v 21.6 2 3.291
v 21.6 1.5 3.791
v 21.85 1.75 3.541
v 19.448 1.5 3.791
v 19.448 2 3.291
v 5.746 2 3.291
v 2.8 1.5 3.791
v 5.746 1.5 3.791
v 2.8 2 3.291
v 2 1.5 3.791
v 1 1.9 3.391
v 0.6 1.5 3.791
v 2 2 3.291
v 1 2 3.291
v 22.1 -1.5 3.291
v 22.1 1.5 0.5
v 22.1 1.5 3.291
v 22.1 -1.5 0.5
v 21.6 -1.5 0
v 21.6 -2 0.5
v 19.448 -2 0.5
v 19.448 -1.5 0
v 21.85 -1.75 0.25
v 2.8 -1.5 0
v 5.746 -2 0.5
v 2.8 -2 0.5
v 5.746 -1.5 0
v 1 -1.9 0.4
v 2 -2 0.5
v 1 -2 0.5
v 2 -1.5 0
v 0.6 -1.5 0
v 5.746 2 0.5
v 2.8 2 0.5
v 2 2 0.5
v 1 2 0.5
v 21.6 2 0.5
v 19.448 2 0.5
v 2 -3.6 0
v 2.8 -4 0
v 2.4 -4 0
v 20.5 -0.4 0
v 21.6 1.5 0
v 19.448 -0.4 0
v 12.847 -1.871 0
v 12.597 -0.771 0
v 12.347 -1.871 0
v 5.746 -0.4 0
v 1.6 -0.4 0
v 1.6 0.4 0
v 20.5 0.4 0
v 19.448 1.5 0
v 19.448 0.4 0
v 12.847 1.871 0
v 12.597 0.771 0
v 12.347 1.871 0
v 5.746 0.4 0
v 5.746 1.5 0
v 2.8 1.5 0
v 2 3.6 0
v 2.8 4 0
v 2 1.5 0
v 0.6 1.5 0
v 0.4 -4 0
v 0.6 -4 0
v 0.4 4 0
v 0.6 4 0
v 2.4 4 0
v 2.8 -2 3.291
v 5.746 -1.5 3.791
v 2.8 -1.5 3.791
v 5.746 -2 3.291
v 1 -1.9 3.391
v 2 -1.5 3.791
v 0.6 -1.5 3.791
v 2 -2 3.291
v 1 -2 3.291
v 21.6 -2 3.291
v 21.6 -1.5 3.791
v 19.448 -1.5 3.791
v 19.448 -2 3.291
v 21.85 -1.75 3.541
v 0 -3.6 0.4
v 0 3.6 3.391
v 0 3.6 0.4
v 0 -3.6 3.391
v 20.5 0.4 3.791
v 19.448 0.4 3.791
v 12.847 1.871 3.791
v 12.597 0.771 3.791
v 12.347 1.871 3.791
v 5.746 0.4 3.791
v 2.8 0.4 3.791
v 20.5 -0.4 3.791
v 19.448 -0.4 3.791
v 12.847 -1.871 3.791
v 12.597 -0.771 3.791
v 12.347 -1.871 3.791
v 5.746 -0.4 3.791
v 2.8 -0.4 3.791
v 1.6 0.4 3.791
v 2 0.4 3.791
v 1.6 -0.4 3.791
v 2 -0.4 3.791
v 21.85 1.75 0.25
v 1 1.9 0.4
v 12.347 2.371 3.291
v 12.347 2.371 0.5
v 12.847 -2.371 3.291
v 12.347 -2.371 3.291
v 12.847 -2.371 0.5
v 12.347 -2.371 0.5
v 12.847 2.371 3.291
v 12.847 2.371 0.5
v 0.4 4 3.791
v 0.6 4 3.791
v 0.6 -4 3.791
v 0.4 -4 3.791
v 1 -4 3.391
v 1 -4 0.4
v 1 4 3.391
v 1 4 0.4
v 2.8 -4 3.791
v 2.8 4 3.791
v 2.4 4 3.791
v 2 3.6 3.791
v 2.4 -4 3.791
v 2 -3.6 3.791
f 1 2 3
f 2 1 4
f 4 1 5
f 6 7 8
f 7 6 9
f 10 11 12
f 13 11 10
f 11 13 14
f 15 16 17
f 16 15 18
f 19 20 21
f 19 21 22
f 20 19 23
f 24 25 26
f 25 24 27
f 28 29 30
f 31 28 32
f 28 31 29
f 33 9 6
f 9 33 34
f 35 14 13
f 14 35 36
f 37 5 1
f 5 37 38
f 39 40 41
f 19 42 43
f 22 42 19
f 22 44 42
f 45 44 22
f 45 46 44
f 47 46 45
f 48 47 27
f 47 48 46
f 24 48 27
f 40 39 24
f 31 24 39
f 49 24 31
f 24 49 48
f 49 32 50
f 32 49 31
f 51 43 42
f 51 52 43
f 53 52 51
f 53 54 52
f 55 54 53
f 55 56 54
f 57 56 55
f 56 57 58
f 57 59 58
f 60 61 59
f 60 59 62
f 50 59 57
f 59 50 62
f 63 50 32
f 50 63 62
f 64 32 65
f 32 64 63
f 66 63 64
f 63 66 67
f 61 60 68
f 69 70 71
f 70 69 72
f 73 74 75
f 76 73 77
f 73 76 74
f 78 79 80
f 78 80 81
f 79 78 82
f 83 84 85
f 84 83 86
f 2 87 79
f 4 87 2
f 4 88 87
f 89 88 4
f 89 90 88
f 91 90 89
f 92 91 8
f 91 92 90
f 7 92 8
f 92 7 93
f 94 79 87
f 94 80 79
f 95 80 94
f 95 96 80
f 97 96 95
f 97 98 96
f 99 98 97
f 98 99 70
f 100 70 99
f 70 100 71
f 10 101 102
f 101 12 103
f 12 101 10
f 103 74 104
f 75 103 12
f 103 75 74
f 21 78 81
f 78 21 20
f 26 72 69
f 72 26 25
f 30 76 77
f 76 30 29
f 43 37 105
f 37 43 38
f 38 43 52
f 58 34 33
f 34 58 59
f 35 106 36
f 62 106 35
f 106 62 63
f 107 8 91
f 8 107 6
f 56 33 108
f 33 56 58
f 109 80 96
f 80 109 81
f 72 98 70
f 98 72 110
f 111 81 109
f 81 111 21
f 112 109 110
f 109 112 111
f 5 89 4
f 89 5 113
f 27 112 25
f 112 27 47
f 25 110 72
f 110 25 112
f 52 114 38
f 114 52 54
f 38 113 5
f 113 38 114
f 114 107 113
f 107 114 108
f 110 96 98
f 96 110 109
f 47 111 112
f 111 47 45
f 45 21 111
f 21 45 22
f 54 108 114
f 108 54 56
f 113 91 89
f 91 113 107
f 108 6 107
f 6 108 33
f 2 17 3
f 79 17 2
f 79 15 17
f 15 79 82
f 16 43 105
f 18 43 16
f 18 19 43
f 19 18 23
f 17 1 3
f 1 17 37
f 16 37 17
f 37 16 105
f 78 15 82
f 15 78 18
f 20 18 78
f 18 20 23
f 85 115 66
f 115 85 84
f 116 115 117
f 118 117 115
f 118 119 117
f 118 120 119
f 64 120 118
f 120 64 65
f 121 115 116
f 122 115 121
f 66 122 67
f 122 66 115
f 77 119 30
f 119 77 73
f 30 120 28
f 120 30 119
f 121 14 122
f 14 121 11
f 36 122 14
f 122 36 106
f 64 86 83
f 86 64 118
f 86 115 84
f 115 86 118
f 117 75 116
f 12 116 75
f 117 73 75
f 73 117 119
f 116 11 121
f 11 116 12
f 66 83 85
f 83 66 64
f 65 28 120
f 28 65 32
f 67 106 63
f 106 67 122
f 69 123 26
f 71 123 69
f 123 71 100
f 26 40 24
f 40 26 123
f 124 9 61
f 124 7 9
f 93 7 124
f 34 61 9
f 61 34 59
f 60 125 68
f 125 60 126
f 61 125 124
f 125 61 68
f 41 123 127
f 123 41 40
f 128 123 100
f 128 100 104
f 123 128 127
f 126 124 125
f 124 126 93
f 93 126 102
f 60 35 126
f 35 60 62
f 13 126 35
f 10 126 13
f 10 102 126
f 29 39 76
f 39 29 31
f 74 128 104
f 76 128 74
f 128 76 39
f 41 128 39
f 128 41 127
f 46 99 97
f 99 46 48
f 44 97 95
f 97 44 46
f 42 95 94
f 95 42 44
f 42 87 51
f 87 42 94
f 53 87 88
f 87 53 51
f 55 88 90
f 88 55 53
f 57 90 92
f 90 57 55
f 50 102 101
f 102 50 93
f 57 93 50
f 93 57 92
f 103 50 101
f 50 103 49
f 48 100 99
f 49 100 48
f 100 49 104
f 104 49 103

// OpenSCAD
height = 3.791;
length = 22.1;
width = 4.0;
taper = 0.743;
taperPosition = 0.57;
taperLength = 0.62;
wall = 1.6;
gripWidth = 8.0;
chamfer = 0.5;
booleanOffset = 0.1;

pin();

module pin () {
    difference() {
        union() {
            difference() {
                mainBody();
                mainBodyChamfer();
            };
            grip();
        };
        linear_extrude(height = height + 2 * booleanOffset) {
            translate([0, 0, -booleanOffset]) {
                cutout();
            };
        };
    };
};

module mainBody() {
    x = width / 2;
    tX = x + (taper / 2);
    
    t1 = length * (taperPosition - (taperLength / 2));
    t2 = (length * taperPosition) - (chamfer / 2);
    t3 = length * (taperPosition + (taperLength / 2));

    rotate([90, 0, 90]) {
        linear_extrude(length) polygon([
            [-x, height - chamfer],
            [-x + chamfer, height],
            [x - chamfer, height],
            [x, height - chamfer],
            [x, chamfer],
            [x - chamfer, 0],
            [-x + chamfer, 0],
            [-x, chamfer],
        ]);
        
        hull() {
        translate([0, 0, t1]) linear_extrude(1) polygon([
            [-x, height - chamfer],
            [-x + chamfer, height],
            [x - chamfer, height],
            [x, height - chamfer],
            [x, chamfer],
            [x - chamfer, 0],
            [-x + chamfer, 0],
            [-x, chamfer],
        ]);
        
        translate([0, 0, t2]) linear_extrude(chamfer) polygon([
            [-tX, height - chamfer],
            [-tX + chamfer, height],
            [tX - chamfer, height],
            [tX, height - chamfer],
            [tX, chamfer],
            [tX - chamfer, 0],
            [-tX + chamfer, 0],
            [-tX, chamfer],
        ]);
        
        translate([0, 0, t3 - 1]) linear_extrude(1) polygon([
            [-x, height - chamfer],
            [-x + chamfer, height],
            [x - chamfer, height],
            [x, height - chamfer],
            [x, chamfer],
            [x - chamfer, 0],
            [-x + chamfer, 0],
            [-x, chamfer],
        ]);
        };
    };
};

module mainBodyChamfer() {
    rotate([90, 0, 0]) {
        linear_extrude(height = gripWidth + booleanOffset, center = true) {
            polygon([
                [-booleanOffset, height + booleanOffset],
                [chamfer, height],
                [0, height - chamfer],
            ]);
            polygon([
                [length, height - chamfer],
                [length + booleanOffset, height + booleanOffset],
                [length - chamfer, height],
            ]);
            polygon([
                [-booleanOffset, -booleanOffset],
                [0, chamfer],
                [chamfer, 0],
            ]);
            polygon([
                [length - chamfer, 0],
                [length, chamfer],
                [length + booleanOffset, -booleanOffset],
            ]);
        };
    };
    linear_extrude(height = 2 * length + booleanOffset, center = true) {
        polygon([
            [length - chamfer, width / 2],
            [length + booleanOffset, width / 2 + booleanOffset],
            [length, width / 2 - chamfer],
        ]);
        polygon([
            [length - chamfer, -width / 2],
            [length, -(width / 2 - chamfer)],
            [length + booleanOffset, -(width / 2 + booleanOffset)],
        ]);
    };
};

module cutout () {
    symmetry() {
        polygon([
            [length * (taperPosition - taperLength / 2.0), width / 2 - wall],
            [length * taperPosition, (width + taper) / 2 - wall],
            [length * (taperPosition + taperLength / 2.0), width / 2 - wall],
            [length - wall, width / 2 - wall],
            [length - wall, 0],
            [wall, 0],
            [wall, width / 2 - wall],
        ]);
    };
};

module grip () {
    thickness = 1.0;
    spacing = 1.0;

    union() {
        gripBlade(thickness);
        translate([(thickness + spacing), 0, 0]) {
            gripBlade(thickness - 0.2);
        };
    };
};

module gripBlade (thickness) {
    chamfer = 0.4;

    difference() {
        linear_extrude(height = height) {
            polygon([
                [thickness, gripWidth / 2],
                [thickness, -gripWidth / 2],
                [chamfer, -gripWidth / 2],
                [0, -(gripWidth / 2 - chamfer)],
                [0, (gripWidth / 2 - chamfer)],
                [chamfer, gripWidth / 2]
            ]);
        }
        
        rotate([90, 0, 0]) {
            linear_extrude(height = gripWidth + booleanOffset, center = true) {
                polygon([
                    [-booleanOffset, height + booleanOffset],
                    [chamfer, height],
                    [0, height - chamfer],
                ]);
                polygon([
                    [thickness, height - chamfer],
                    [thickness + booleanOffset, height + booleanOffset],
                    [thickness - chamfer, height],
                ]);
                polygon([
                    [-booleanOffset, -booleanOffset],
                    [0, chamfer],
                    [chamfer, 0],
                ]);
                polygon([
                    [thickness - chamfer, 0],
                    [thickness, chamfer],
                    [thickness + booleanOffset, -booleanOffset],
                ]);
            };
        };
    };
};

// Utilities

module symmetry () {
    children();
    mirror([0,1,0]) {
        children();
    };
};
